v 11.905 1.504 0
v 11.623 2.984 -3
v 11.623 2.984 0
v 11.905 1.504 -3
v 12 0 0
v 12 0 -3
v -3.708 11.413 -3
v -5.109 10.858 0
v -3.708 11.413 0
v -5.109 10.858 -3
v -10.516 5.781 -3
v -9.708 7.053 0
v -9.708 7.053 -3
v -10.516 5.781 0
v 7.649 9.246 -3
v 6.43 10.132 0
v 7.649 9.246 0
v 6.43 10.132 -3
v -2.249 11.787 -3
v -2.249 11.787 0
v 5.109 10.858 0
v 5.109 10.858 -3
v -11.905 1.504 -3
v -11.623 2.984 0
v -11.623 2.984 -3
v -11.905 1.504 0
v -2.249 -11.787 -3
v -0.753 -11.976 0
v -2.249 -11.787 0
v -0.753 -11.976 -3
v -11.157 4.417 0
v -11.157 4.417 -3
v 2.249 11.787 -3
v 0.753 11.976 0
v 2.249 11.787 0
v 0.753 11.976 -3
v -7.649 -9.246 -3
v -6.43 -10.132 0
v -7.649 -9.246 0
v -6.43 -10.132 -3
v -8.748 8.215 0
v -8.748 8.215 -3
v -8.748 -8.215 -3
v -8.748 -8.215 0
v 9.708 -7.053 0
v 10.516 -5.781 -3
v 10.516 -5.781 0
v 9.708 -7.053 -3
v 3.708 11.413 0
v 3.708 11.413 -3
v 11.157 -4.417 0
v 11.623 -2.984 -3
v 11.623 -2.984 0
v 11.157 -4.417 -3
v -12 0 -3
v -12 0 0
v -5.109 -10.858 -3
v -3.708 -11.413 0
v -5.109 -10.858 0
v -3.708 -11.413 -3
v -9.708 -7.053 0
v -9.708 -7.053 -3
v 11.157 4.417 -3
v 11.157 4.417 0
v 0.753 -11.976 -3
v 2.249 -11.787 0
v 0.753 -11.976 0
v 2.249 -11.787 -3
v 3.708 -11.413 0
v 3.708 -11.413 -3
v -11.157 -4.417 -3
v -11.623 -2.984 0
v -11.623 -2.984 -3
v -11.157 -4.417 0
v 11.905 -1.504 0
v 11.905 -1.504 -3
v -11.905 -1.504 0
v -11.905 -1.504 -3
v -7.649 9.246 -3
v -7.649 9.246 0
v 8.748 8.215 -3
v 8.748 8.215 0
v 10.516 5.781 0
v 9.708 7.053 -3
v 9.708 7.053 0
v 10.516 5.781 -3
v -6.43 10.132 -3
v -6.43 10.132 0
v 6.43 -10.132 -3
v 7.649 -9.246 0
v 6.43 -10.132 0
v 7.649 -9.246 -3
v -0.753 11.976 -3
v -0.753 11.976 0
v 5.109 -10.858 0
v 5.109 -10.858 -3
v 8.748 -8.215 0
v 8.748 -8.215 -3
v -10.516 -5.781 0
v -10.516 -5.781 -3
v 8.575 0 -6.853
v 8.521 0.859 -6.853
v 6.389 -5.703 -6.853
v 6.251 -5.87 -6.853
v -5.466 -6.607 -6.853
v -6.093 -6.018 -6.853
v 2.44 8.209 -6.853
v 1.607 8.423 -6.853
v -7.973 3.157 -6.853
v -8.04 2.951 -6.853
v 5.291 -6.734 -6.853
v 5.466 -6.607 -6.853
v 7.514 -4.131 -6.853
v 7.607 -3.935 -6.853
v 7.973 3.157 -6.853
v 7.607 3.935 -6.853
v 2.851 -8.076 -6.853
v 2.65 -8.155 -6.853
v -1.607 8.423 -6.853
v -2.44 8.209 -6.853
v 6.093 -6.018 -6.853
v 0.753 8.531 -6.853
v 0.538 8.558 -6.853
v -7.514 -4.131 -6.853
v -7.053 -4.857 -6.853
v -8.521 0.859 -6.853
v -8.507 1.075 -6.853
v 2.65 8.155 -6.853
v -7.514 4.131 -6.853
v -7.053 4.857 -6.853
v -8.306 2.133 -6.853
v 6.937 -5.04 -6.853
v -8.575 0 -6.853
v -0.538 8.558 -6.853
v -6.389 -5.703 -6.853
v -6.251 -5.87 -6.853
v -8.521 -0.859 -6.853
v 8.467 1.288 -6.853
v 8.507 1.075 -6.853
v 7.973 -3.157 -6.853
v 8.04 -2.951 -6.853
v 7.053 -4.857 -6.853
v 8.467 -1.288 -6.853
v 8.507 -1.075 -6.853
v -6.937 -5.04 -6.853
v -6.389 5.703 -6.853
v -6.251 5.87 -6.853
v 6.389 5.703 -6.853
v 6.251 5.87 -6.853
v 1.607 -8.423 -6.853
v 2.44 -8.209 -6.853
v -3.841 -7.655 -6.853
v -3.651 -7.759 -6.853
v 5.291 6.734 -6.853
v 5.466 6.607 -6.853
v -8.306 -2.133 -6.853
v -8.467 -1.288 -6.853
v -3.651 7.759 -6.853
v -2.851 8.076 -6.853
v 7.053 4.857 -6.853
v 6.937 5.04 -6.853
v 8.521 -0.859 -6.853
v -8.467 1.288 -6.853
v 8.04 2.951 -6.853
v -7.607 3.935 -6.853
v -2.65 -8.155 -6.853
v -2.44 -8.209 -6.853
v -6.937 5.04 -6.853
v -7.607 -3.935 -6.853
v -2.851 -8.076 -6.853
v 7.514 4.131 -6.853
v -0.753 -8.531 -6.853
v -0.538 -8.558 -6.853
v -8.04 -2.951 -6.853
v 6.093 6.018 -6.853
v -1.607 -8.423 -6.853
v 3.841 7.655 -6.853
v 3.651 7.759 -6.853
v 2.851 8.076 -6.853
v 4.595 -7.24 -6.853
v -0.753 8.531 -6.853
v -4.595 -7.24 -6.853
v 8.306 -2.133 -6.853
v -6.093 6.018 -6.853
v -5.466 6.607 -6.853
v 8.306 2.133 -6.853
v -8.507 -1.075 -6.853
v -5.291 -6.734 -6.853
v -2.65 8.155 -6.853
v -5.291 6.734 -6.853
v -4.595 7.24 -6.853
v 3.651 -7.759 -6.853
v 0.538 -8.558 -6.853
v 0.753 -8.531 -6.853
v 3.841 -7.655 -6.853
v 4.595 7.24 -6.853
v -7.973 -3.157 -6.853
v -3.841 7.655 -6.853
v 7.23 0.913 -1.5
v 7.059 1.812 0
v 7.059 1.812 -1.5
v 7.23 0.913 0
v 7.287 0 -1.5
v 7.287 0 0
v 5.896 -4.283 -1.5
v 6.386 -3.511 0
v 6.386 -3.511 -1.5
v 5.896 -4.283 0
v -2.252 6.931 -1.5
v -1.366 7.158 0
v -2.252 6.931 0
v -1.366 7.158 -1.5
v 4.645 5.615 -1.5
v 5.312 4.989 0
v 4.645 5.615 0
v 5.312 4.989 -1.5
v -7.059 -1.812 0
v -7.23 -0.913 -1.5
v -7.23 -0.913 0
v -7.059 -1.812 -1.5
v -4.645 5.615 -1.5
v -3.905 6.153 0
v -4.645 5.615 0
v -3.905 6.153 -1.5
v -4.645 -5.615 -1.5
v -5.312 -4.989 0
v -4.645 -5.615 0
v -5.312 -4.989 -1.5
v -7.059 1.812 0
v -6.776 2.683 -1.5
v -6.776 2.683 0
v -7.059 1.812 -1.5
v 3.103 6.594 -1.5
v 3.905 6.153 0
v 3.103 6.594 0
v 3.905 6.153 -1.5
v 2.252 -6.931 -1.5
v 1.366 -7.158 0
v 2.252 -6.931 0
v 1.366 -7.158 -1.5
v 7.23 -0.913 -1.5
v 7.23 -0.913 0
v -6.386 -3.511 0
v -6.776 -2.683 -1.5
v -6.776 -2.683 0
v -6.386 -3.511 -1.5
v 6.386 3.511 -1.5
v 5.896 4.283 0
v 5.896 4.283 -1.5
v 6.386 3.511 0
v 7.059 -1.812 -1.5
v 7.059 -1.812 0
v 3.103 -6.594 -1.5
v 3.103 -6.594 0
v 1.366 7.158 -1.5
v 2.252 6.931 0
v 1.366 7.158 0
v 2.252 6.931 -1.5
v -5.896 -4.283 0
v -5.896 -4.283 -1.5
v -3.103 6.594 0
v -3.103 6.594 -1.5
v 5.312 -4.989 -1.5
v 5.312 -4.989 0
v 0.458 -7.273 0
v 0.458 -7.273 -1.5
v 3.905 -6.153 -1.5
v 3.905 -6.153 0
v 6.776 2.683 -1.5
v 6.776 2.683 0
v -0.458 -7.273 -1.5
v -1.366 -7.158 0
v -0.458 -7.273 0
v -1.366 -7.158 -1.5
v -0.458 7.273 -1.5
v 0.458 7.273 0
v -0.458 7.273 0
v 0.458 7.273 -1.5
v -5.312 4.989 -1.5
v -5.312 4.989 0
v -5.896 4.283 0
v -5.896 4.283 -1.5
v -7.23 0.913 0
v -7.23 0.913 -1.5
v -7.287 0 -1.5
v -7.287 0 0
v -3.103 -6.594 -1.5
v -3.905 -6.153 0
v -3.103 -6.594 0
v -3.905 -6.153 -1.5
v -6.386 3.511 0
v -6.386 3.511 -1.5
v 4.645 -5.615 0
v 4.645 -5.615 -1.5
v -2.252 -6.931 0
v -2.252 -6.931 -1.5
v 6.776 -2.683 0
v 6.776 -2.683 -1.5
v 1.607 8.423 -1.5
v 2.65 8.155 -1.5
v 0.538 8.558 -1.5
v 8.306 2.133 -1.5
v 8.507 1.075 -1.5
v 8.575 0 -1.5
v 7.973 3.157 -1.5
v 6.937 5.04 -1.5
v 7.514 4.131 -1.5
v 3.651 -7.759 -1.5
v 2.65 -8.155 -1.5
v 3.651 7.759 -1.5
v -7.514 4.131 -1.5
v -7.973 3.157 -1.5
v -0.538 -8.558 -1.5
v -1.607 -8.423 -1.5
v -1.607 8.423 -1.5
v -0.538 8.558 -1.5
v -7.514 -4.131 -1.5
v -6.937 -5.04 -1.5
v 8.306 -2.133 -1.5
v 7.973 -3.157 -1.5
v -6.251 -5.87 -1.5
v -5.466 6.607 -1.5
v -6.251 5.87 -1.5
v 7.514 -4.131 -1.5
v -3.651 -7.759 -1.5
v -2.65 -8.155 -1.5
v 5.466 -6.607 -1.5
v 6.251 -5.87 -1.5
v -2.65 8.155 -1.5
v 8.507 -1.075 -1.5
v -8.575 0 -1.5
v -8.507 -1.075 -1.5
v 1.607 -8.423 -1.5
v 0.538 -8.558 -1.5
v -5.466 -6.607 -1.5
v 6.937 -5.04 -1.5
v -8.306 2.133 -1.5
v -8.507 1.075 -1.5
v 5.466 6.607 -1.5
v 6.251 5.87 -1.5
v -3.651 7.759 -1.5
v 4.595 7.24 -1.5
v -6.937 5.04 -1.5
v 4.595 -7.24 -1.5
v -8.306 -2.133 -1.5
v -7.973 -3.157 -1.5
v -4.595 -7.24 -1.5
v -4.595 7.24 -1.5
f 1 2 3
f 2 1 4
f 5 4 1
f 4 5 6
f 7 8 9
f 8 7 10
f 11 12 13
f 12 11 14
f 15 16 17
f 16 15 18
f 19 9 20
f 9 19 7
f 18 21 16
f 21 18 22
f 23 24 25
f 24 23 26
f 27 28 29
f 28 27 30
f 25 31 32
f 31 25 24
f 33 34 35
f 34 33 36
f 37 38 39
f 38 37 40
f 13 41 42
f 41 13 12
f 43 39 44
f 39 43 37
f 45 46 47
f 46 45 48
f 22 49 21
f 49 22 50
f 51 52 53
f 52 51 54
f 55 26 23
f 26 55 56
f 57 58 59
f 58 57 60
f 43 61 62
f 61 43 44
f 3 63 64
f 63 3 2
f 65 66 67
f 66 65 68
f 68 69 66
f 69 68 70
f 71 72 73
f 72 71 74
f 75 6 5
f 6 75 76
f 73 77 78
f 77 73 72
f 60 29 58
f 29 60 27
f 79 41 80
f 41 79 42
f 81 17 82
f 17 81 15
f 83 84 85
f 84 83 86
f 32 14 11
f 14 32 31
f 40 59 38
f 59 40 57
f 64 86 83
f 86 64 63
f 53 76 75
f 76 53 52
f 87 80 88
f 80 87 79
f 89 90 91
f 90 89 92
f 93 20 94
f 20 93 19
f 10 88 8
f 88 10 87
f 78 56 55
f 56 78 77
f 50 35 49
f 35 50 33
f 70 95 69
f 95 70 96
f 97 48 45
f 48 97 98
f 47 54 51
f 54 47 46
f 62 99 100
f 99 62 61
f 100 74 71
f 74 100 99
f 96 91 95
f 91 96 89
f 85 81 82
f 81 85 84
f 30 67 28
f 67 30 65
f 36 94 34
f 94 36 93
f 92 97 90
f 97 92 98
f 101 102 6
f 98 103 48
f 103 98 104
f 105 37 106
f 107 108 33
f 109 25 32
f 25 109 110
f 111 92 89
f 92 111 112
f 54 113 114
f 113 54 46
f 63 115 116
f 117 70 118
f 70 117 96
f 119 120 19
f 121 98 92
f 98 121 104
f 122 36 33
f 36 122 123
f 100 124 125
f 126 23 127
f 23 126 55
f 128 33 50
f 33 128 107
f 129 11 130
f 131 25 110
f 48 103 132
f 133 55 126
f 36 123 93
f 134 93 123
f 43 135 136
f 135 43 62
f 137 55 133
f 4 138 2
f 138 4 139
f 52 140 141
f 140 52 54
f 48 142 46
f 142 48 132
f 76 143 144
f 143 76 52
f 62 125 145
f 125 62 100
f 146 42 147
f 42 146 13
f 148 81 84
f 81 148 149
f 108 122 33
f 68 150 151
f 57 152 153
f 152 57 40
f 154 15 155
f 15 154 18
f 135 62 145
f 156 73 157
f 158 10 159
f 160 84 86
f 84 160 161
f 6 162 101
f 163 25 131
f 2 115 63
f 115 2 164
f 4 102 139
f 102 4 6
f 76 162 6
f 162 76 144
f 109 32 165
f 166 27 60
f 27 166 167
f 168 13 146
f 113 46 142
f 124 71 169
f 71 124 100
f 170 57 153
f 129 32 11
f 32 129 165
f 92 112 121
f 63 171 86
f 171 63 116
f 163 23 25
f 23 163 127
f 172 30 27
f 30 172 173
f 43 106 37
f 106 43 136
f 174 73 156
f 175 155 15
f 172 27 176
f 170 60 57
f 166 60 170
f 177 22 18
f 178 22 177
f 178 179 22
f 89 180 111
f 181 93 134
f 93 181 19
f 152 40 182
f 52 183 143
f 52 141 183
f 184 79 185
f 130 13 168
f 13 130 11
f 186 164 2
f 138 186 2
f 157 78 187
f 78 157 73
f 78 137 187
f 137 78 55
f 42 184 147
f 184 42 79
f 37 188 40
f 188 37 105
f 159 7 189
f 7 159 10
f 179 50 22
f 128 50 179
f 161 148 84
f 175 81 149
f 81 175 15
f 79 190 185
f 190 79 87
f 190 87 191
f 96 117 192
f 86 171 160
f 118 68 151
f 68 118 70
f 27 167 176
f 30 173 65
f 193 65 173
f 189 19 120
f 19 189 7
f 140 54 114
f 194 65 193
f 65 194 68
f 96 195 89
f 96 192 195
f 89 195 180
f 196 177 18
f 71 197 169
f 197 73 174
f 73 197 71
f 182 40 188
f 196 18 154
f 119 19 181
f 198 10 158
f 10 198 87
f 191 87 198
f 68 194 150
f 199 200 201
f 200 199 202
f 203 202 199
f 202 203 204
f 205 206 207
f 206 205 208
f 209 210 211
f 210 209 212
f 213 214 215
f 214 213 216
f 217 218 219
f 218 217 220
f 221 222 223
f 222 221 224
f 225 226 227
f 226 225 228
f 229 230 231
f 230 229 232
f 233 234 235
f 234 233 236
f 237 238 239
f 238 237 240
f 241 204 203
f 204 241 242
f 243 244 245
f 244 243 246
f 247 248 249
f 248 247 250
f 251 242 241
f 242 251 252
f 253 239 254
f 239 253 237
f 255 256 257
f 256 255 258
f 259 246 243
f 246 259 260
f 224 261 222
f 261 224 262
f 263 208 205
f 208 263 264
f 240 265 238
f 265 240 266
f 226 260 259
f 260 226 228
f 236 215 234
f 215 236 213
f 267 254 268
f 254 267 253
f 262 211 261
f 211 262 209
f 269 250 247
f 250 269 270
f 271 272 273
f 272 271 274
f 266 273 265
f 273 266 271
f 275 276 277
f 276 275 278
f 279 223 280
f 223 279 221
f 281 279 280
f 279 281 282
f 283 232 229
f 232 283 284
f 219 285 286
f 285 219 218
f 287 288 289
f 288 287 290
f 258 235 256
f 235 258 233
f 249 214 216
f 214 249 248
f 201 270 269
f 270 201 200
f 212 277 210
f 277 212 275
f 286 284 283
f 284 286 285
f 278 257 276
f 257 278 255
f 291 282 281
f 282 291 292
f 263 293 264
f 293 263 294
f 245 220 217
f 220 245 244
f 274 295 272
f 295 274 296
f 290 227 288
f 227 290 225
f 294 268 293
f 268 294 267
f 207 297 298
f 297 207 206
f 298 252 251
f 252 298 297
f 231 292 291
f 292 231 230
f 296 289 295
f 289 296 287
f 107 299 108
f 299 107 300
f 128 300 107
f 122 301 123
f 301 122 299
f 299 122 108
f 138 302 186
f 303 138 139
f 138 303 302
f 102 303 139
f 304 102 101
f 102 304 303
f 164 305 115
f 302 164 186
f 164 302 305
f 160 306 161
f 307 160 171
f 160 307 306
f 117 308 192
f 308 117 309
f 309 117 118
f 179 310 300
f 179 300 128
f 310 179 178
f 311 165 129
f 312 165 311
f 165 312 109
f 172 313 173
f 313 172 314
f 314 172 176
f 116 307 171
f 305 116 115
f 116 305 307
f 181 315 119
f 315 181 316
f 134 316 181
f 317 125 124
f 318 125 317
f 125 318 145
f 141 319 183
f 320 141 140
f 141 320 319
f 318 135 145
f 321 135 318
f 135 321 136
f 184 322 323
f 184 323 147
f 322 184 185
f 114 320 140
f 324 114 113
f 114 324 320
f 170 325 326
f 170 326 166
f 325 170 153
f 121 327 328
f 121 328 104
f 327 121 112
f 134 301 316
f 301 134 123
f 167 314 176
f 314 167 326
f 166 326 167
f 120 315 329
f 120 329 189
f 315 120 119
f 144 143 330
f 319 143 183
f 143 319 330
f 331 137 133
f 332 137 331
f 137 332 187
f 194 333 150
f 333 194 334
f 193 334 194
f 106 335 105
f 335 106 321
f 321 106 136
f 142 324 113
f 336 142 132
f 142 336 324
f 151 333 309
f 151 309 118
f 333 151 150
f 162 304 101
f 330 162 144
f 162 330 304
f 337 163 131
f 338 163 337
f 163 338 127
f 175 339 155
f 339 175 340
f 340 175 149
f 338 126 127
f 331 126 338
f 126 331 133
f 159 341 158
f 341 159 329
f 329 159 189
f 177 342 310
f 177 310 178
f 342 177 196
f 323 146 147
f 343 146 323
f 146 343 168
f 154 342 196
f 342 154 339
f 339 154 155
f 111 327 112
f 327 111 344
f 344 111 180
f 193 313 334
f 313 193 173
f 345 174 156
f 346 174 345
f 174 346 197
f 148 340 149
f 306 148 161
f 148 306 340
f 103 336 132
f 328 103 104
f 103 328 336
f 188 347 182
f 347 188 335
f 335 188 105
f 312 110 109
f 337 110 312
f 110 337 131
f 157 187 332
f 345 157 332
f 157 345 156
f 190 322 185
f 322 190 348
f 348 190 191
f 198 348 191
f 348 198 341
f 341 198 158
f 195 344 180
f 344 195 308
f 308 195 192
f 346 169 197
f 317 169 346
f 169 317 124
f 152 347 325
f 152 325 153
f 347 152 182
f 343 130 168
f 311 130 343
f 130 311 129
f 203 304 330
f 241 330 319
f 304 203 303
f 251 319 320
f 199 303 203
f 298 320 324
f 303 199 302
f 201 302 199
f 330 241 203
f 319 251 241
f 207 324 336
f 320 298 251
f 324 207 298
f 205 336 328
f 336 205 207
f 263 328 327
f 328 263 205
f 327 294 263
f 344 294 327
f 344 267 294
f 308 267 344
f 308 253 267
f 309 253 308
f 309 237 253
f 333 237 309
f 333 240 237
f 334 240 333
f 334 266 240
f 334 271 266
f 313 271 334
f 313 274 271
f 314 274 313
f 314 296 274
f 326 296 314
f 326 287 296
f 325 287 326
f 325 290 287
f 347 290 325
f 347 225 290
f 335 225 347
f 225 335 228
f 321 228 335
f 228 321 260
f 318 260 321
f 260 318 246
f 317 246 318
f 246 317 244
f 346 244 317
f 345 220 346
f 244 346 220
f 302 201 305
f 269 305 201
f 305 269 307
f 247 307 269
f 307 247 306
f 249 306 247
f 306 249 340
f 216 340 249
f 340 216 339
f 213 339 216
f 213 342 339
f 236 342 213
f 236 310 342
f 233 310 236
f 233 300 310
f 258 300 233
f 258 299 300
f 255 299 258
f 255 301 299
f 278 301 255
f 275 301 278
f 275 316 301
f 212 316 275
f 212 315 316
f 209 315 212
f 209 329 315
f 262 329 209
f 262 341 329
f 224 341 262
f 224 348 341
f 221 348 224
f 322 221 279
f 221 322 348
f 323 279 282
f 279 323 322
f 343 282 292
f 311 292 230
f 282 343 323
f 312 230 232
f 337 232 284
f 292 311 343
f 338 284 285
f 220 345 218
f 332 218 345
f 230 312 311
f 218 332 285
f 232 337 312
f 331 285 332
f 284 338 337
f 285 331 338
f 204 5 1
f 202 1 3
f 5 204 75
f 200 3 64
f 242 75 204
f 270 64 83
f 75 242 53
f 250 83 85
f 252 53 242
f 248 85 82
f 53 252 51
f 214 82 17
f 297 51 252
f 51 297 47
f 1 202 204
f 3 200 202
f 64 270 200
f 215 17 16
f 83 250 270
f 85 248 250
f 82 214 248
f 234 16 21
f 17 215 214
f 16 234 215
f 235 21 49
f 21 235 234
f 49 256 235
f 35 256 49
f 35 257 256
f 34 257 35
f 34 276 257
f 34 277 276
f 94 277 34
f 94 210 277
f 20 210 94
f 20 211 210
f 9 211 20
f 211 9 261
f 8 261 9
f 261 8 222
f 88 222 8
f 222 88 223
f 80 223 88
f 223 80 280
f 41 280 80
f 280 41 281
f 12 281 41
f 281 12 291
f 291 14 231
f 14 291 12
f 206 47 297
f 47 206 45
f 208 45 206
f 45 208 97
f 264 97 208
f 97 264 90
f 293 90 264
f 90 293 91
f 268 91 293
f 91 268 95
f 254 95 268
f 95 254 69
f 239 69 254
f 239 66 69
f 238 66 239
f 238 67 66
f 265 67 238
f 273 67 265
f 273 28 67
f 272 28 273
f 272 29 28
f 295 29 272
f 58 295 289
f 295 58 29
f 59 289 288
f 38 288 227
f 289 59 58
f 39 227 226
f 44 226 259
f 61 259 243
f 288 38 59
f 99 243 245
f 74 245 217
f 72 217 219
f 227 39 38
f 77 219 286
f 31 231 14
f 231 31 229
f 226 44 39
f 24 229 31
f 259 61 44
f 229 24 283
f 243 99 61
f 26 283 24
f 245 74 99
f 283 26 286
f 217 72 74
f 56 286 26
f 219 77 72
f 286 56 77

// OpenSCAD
$fn = 50;


difference() {
	union() {
		translate(v = [0, 0, -3.0000000000]) {
			cylinder(h = 6, r = 12.0000000000);
		}
		translate(v = [0, 0, 3.0000000000]) {
			cylinder(h = 4.5000000000, r1 = 12.0000000000, r2 = 8.0000000000);
		}
		translate(v = [0, 0, -7.5000000000]) {
			cylinder(h = 4.5000000000, r1 = 8.0000000000, r2 = 12.0000000000);
		}
	}
	union() {
		translate(v = [0, 0, -100.0000000000]) {
			cylinder(h = 200, r = 5);
		}
		translate(v = [0, 0, 4.5000000000]) {
			translate(v = [0, 0, -3.0000000000]) {
				union() {
					difference() {
						#cylinder(h = 6, r = 8.5750000000);
						#cylinder(h = 6, r = 3.0000000000);
					}
					difference() {
						#translate(v = [0, 0, -50]) {
							cylinder(h = 100, r = 7.2875000000);
						}
					}
				}
			}
		}
		translate(v = [0, 0, -4.5000000000]) {
			translate(v = [0, 0, -3.0000000000]) {
				union() {
					difference() {
						#cylinder(h = 6, r = 8.5750000000);
						#cylinder(h = 6, r = 3.0000000000);
					}
					difference() {
						#translate(v = [0, 0, -50]) {
							cylinder(h = 100, r = 7.2875000000);
						}
					}
				}
			}
		}
		translate(v = [-250.0000000000, -250.0000000000, 0]) {
			cube(size = [500, 500, 500]);
		}
		translate(v = [-250.0000000000, -250.0000000000, 0]) {
			cube(size = [500, 500, 500]);
		}
		translate(v = [-250.0000000000, -250.0000000000, 0]) {
			cube(size = [500, 500, 500]);
		}
	}
}
